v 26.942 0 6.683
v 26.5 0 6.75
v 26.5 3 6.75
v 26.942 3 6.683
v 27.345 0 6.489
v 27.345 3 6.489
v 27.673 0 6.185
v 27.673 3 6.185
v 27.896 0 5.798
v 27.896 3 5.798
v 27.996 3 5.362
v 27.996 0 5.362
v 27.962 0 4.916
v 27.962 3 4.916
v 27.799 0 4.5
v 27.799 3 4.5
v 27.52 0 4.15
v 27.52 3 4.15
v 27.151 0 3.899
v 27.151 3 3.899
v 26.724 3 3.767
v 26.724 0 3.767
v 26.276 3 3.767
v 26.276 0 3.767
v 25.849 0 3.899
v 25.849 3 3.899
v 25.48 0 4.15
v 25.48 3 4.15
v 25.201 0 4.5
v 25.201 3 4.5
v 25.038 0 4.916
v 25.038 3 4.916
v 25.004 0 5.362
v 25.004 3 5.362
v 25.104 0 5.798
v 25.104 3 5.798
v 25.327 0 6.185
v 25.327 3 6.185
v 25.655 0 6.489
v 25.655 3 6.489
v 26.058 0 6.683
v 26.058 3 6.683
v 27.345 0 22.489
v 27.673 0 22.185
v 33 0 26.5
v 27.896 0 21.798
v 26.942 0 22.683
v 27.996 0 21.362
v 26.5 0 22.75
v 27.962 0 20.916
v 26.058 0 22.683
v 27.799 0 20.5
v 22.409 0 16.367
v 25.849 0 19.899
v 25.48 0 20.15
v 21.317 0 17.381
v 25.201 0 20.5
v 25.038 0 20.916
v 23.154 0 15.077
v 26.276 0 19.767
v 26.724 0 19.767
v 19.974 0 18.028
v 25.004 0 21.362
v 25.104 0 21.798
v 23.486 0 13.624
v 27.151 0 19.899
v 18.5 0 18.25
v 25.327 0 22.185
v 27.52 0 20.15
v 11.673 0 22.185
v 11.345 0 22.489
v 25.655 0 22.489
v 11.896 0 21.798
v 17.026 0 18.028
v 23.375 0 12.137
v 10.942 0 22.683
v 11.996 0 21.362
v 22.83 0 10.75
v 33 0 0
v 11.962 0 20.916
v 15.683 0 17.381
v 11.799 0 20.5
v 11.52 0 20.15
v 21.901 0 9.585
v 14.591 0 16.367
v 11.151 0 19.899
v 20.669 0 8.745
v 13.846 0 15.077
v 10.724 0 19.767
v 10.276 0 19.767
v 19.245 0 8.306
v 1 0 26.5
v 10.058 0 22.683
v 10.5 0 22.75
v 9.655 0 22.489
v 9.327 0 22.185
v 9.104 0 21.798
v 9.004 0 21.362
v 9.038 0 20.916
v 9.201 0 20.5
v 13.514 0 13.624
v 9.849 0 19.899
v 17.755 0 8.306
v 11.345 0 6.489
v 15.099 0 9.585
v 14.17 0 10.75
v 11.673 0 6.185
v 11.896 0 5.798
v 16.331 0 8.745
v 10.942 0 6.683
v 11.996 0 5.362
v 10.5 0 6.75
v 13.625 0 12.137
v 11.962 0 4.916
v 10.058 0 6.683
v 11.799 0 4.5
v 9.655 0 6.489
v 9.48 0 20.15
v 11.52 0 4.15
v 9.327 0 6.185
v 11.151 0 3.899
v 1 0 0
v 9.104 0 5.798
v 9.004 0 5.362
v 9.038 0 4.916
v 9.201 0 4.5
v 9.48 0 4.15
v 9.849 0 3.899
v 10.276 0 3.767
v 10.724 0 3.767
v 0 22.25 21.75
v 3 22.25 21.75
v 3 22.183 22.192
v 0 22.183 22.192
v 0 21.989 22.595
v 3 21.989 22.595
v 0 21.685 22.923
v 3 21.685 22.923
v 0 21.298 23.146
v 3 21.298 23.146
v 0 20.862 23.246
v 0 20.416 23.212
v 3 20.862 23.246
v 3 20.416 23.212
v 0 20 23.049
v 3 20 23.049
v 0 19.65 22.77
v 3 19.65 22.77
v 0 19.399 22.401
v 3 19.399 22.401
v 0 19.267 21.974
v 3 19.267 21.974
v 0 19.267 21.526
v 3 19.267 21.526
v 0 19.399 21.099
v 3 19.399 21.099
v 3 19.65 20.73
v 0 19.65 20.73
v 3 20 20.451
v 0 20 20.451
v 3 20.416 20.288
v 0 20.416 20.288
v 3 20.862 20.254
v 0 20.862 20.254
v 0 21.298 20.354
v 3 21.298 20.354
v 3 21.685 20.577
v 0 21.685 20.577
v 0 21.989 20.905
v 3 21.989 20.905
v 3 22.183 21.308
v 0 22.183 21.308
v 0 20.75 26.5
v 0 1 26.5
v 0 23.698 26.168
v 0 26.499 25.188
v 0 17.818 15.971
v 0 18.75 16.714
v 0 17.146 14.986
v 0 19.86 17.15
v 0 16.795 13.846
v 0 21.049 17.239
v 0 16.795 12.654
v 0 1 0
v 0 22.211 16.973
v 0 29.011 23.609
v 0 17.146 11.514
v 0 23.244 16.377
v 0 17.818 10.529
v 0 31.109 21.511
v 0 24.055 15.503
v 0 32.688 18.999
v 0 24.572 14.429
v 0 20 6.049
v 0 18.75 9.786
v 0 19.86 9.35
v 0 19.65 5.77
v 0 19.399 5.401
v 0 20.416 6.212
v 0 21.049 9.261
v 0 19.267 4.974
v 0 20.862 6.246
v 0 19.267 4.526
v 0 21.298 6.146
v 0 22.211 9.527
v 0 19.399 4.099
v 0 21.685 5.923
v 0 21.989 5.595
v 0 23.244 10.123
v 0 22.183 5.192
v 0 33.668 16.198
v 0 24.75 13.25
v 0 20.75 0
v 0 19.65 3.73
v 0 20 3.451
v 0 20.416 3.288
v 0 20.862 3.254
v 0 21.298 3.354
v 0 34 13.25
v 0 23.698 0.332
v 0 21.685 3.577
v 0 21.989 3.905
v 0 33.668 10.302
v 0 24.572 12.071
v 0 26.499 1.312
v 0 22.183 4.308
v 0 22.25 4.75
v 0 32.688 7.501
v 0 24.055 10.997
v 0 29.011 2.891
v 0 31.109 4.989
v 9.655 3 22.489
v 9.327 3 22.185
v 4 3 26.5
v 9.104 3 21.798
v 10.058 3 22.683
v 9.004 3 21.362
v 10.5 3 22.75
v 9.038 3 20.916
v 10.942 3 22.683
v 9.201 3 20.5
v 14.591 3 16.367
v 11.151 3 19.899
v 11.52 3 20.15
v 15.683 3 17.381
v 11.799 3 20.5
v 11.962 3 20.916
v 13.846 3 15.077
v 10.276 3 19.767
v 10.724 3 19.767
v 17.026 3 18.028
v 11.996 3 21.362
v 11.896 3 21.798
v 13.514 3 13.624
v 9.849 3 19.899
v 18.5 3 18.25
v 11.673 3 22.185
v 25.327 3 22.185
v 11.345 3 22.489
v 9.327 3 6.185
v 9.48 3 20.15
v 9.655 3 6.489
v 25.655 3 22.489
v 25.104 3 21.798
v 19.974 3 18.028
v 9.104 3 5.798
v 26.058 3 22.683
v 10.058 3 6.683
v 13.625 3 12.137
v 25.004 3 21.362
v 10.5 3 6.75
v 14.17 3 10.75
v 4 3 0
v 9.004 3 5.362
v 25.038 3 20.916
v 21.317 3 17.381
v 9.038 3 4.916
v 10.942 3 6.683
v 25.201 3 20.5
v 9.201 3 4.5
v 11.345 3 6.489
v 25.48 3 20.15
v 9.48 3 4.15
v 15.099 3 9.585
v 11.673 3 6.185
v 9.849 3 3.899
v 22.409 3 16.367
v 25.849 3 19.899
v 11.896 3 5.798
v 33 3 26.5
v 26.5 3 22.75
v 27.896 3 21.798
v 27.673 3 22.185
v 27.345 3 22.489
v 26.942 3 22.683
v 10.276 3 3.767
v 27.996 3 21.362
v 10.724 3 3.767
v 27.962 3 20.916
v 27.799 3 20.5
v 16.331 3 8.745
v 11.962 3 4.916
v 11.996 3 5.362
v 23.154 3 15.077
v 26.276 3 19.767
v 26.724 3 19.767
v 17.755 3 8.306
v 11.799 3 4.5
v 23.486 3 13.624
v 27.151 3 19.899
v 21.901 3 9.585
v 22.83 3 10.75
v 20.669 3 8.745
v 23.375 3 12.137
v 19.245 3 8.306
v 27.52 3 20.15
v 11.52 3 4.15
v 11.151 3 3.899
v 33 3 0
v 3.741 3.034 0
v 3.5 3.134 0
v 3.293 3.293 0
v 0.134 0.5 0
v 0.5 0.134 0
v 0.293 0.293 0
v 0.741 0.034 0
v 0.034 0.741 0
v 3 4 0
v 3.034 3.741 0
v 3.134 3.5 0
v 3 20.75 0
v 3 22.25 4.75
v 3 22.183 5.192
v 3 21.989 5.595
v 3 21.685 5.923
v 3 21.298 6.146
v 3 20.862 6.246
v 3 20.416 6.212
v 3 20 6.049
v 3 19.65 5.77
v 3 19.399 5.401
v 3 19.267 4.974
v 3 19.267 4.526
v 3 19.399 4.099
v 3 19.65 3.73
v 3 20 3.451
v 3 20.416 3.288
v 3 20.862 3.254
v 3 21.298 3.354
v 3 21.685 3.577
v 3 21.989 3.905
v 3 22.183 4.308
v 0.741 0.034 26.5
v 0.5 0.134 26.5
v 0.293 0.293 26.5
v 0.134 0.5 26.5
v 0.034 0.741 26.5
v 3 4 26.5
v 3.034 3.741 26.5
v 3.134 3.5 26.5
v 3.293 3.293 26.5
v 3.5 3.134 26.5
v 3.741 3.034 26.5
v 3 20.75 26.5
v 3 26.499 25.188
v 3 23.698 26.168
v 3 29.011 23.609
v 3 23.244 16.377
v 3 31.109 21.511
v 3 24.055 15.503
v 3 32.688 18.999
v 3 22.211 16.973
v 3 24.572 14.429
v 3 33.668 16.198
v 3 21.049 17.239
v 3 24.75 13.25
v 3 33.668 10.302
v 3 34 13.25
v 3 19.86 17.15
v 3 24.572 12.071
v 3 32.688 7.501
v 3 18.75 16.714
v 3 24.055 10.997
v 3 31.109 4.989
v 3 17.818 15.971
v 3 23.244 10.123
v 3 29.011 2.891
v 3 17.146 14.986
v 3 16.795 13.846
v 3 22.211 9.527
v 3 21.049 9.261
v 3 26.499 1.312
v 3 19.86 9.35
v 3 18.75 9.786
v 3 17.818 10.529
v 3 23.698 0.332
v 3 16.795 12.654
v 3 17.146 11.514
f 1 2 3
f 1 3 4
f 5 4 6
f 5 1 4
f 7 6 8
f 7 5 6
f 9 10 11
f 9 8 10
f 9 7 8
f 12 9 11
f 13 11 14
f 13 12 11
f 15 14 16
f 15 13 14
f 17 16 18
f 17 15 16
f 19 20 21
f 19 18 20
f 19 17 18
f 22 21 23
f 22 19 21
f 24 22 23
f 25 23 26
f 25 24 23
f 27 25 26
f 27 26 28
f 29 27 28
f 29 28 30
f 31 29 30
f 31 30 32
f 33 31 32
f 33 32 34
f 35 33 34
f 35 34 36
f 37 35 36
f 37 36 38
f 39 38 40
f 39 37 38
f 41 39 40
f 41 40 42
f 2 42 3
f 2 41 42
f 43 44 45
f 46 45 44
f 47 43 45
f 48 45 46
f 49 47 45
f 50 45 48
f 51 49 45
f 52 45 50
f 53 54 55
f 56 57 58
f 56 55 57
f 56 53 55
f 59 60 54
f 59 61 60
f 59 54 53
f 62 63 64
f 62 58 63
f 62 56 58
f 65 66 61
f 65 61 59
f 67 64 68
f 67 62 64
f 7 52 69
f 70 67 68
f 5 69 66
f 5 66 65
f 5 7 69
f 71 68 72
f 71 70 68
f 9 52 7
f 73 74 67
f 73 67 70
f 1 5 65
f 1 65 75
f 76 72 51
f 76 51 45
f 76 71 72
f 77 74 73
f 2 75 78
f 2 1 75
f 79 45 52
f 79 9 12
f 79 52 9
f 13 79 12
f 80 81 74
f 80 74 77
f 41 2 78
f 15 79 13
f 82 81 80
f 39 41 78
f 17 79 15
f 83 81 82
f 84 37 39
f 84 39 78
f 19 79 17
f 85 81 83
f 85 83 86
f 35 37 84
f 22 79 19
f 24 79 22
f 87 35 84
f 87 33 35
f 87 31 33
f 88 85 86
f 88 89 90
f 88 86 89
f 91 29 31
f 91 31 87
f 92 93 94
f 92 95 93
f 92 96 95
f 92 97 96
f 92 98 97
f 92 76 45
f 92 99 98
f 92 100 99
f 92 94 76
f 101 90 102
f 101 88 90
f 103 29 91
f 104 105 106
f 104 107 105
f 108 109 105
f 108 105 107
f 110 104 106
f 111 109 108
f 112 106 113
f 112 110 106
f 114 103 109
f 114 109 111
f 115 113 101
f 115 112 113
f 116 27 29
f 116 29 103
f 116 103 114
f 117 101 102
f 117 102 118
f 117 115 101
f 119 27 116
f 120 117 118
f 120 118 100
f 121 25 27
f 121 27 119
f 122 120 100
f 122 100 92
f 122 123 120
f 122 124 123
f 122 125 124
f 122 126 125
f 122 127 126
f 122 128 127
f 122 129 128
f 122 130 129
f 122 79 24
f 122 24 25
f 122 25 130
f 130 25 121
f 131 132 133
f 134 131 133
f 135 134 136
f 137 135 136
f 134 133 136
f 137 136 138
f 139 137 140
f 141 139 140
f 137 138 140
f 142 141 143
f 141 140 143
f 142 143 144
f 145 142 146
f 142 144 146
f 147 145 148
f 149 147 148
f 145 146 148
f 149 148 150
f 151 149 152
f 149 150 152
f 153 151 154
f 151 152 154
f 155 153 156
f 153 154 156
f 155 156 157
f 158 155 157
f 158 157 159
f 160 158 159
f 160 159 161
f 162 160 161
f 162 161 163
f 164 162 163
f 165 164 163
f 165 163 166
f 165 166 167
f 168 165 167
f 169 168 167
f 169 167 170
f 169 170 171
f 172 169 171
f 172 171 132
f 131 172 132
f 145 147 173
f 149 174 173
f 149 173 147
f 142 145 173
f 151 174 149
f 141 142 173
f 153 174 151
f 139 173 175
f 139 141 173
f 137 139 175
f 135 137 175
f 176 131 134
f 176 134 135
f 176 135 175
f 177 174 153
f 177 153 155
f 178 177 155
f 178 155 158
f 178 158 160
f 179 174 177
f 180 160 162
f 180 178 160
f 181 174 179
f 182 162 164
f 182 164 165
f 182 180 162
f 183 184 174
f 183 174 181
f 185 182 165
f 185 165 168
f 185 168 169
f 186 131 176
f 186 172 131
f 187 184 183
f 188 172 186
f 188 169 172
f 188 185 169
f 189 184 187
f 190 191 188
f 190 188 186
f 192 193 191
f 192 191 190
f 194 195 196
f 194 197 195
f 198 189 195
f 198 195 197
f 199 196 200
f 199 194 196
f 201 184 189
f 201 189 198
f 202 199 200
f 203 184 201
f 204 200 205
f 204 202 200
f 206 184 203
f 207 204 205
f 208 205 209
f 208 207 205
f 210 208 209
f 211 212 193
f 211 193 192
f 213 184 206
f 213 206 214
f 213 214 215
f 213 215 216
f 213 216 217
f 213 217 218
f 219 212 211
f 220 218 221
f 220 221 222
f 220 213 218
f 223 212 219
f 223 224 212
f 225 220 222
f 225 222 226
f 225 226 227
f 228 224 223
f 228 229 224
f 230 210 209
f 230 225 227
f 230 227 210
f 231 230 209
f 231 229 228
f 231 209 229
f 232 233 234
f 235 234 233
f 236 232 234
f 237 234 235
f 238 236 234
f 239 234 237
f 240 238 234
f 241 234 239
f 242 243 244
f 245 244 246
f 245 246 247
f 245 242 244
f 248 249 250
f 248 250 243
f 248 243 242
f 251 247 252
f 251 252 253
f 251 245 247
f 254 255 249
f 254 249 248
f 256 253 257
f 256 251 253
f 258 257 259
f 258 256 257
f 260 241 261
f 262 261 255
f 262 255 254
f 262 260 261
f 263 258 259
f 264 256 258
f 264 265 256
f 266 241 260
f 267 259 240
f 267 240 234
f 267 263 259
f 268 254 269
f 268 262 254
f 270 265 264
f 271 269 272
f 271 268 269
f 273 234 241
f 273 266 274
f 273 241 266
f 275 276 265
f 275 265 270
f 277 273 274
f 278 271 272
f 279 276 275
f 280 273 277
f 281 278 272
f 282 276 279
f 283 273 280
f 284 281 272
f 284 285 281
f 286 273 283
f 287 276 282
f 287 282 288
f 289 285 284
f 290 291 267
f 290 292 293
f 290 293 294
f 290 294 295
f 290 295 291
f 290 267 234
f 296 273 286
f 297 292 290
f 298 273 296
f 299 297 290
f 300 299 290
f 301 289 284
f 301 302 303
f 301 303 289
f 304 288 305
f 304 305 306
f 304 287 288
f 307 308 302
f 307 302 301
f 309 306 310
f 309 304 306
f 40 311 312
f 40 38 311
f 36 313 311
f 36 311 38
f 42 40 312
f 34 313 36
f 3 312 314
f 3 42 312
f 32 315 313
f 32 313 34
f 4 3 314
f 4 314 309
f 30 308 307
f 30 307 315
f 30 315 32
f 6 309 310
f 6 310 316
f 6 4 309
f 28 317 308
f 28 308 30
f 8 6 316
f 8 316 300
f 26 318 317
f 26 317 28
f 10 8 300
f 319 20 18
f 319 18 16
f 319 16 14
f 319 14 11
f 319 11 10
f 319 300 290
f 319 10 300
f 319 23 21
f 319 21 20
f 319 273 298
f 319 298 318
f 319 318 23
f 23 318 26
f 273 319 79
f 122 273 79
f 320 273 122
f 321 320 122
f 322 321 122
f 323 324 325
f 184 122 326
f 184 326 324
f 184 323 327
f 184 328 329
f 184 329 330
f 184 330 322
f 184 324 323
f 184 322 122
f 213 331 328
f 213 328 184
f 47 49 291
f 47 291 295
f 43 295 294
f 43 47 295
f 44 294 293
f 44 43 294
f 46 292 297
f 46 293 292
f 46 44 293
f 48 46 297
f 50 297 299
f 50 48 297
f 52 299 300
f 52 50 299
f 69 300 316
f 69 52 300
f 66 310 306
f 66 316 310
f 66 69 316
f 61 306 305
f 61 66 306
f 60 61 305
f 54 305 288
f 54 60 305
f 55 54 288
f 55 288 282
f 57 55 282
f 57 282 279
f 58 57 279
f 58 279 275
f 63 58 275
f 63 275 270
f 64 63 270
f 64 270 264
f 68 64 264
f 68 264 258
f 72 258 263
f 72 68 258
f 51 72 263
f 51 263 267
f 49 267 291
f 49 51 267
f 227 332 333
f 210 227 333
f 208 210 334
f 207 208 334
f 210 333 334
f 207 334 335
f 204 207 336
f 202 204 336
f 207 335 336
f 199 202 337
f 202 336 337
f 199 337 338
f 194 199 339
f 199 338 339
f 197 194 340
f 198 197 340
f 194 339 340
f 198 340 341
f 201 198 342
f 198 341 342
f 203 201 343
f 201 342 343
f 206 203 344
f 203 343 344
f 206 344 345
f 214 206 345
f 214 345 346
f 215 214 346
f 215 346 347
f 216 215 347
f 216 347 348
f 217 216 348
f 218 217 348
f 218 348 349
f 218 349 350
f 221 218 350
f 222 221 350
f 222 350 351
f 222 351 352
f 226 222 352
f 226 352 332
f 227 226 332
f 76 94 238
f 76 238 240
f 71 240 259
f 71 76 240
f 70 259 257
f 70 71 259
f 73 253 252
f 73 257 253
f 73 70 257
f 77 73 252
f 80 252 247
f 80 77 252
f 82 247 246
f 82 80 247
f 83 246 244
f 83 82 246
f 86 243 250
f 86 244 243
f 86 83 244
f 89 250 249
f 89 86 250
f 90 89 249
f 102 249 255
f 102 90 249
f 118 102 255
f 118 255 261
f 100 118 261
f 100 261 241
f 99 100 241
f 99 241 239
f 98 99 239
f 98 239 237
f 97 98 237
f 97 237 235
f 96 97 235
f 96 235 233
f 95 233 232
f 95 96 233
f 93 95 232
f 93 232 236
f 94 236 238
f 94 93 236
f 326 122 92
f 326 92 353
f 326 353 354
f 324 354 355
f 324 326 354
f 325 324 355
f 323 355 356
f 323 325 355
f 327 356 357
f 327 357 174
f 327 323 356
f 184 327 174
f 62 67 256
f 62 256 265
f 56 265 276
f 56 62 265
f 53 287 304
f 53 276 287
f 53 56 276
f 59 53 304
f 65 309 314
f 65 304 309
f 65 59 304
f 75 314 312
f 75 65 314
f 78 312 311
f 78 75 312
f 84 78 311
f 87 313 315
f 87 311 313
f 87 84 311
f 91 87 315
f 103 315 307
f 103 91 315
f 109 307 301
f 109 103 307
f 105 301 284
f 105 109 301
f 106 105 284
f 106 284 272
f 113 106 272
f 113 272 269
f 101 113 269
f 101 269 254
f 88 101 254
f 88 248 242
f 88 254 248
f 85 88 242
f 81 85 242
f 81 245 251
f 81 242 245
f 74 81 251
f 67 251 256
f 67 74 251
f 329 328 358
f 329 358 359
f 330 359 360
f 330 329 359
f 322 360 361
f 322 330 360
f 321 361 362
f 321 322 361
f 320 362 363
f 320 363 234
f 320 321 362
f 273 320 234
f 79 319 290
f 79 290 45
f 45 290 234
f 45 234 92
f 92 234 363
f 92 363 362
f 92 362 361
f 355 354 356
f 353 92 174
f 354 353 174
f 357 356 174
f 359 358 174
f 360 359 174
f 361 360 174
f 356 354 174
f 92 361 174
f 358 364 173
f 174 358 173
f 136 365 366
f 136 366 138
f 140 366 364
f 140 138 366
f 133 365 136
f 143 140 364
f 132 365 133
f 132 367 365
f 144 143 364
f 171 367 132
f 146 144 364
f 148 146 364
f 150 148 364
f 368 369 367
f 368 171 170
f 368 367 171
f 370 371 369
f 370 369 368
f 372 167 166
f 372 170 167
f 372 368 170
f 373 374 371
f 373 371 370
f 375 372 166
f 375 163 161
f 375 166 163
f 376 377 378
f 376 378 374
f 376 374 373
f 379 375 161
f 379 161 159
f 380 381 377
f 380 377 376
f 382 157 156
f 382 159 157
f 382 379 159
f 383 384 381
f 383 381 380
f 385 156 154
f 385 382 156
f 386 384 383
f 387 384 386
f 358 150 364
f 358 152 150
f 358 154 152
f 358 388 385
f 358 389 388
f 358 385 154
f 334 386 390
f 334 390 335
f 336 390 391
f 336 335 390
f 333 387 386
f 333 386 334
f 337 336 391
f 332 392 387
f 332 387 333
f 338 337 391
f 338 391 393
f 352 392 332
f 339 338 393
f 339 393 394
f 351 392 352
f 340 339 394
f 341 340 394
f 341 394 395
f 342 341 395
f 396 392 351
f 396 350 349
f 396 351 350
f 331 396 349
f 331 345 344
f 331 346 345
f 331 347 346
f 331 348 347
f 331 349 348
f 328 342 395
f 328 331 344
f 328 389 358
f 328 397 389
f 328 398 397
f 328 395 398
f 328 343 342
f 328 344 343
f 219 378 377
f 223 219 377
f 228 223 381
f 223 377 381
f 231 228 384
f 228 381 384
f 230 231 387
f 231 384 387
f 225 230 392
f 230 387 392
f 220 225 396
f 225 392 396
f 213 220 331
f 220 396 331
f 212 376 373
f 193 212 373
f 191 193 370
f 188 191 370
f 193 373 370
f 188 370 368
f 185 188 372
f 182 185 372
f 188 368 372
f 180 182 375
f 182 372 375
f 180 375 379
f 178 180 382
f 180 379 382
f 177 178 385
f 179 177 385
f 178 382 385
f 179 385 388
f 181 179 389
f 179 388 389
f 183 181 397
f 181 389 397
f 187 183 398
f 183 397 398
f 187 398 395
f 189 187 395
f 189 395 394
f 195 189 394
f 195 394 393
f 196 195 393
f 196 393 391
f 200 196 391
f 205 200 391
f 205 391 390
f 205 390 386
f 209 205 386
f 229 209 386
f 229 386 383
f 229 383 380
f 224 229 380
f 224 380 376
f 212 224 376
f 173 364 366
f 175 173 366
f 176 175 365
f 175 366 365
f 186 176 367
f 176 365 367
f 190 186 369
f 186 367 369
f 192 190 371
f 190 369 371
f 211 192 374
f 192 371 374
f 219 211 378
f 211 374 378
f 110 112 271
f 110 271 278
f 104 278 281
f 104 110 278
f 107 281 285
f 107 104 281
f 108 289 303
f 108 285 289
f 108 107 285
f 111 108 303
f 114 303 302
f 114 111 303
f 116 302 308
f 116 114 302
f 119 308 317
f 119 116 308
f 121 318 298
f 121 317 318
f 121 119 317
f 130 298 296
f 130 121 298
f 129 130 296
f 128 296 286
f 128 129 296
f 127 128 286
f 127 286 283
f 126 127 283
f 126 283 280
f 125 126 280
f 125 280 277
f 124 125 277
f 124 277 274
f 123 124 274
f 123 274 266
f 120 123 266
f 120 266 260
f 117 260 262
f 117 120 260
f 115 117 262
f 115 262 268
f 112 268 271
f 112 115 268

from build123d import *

# Parameters (mm, degrees)
EXTRUDE_1_DEPTH          = 26.5
SKETCH_3_R               = 1.5
CUT_EXTRUDE_1_DEPTH      = 53.519044165
SKETCH_3_3_R             = 4
CUT_EXTRUDE_2_DEPTH      = 53.519044165
CUT_EXTRUDE_3_DEPTH      = 53.46189093
CUT_EXTRUDE_3_DEPTH_BACK = 53.46189093
SKETCH_4_R               = 5
SKETCH_4_R_2             = 1.5


with BuildPart() as part:
    # 草图2 → 凸台-拉伸1 (new body)
    with BuildSketch(Plane.XY):
        with BuildLine():
            Line((0, 1), (0, 34))
            Line((0, 34), (3, 34))
            Line((3, 34), (3, 4))
            ThreePointArc((3, 4), (3.292893219, 3.292893219), (4, 3))
            Line((4, 3), (33, 3))
            Line((33, 3), (33, 0))
            Line((33, 0), (1, 0))
            ThreePointArc((1, 0), (0.292893219, 0.292893219), (0, 1))
        make_face()
    extrude(amount=EXTRUDE_1_DEPTH)

    # 草图3 → 切除-拉伸1 (cut, through all)
    with BuildSketch(Plane(origin=(3, 0, 0), x_dir=(0, 0, -1), z_dir=(1, 0, 0))):
        with Locations((-4.75, 20.75)):
            Circle(SKETCH_3_R)
        with BuildLine():
            ThreePointArc((-13.25, 34), (-3.880835149, 30.119164851), (0, 20.75))
            Line((0, 20.75), (0, 34))
            Line((0, 34), (-13.25, 34))
        make_face()
        with BuildLine():
            ThreePointArc((-26.5, 20.75), (-22.619164851, 30.119164851), (-13.25, 34))
            Line((-13.25, 34), (-26.5, 34))
            Line((-26.5, 34), (-26.5, 20.75))
        make_face()
        with Locations((-21.75, 20.75)):
            Circle(SKETCH_3_R)
    extrude(amount=-CUT_EXTRUDE_1_DEPTH, mode=Mode.SUBTRACT)

    # 草图3<3> → 切除-拉伸2 (cut, through all)
    with BuildSketch(Plane(origin=(3, 0, 0), x_dir=(0, 0, -1), z_dir=(1, 0, 0))):
        with Locations((-13.25, 20.75)):
            Circle(SKETCH_3_3_R)
    extrude(amount=-CUT_EXTRUDE_2_DEPTH, mode=Mode.SUBTRACT)

    # 草图4 → 切除-拉伸3 (cut, two sides: drawn at the far end of the back side and taken through both)
    with BuildSketch(Plane(origin=(0, 3, 0), x_dir=(1, 0, 0), z_dir=(0, 1, 0)).offset(-CUT_EXTRUDE_3_DEPTH_BACK)):
        with Locations((18.5, -13.25)):
            Circle(SKETCH_4_R)
        with Locations((26.5, -5.25)):
            Circle(SKETCH_4_R_2)
        with Locations((10.5, -5.25)):
            Circle(SKETCH_4_R_2)
        with Locations((10.5, -21.25)):
            Circle(SKETCH_4_R_2)
        with Locations((26.5, -21.25)):
            Circle(SKETCH_4_R_2)
    extrude(amount=CUT_EXTRUDE_3_DEPTH + CUT_EXTRUDE_3_DEPTH_BACK, mode=Mode.SUBTRACT)


solid = part.part
